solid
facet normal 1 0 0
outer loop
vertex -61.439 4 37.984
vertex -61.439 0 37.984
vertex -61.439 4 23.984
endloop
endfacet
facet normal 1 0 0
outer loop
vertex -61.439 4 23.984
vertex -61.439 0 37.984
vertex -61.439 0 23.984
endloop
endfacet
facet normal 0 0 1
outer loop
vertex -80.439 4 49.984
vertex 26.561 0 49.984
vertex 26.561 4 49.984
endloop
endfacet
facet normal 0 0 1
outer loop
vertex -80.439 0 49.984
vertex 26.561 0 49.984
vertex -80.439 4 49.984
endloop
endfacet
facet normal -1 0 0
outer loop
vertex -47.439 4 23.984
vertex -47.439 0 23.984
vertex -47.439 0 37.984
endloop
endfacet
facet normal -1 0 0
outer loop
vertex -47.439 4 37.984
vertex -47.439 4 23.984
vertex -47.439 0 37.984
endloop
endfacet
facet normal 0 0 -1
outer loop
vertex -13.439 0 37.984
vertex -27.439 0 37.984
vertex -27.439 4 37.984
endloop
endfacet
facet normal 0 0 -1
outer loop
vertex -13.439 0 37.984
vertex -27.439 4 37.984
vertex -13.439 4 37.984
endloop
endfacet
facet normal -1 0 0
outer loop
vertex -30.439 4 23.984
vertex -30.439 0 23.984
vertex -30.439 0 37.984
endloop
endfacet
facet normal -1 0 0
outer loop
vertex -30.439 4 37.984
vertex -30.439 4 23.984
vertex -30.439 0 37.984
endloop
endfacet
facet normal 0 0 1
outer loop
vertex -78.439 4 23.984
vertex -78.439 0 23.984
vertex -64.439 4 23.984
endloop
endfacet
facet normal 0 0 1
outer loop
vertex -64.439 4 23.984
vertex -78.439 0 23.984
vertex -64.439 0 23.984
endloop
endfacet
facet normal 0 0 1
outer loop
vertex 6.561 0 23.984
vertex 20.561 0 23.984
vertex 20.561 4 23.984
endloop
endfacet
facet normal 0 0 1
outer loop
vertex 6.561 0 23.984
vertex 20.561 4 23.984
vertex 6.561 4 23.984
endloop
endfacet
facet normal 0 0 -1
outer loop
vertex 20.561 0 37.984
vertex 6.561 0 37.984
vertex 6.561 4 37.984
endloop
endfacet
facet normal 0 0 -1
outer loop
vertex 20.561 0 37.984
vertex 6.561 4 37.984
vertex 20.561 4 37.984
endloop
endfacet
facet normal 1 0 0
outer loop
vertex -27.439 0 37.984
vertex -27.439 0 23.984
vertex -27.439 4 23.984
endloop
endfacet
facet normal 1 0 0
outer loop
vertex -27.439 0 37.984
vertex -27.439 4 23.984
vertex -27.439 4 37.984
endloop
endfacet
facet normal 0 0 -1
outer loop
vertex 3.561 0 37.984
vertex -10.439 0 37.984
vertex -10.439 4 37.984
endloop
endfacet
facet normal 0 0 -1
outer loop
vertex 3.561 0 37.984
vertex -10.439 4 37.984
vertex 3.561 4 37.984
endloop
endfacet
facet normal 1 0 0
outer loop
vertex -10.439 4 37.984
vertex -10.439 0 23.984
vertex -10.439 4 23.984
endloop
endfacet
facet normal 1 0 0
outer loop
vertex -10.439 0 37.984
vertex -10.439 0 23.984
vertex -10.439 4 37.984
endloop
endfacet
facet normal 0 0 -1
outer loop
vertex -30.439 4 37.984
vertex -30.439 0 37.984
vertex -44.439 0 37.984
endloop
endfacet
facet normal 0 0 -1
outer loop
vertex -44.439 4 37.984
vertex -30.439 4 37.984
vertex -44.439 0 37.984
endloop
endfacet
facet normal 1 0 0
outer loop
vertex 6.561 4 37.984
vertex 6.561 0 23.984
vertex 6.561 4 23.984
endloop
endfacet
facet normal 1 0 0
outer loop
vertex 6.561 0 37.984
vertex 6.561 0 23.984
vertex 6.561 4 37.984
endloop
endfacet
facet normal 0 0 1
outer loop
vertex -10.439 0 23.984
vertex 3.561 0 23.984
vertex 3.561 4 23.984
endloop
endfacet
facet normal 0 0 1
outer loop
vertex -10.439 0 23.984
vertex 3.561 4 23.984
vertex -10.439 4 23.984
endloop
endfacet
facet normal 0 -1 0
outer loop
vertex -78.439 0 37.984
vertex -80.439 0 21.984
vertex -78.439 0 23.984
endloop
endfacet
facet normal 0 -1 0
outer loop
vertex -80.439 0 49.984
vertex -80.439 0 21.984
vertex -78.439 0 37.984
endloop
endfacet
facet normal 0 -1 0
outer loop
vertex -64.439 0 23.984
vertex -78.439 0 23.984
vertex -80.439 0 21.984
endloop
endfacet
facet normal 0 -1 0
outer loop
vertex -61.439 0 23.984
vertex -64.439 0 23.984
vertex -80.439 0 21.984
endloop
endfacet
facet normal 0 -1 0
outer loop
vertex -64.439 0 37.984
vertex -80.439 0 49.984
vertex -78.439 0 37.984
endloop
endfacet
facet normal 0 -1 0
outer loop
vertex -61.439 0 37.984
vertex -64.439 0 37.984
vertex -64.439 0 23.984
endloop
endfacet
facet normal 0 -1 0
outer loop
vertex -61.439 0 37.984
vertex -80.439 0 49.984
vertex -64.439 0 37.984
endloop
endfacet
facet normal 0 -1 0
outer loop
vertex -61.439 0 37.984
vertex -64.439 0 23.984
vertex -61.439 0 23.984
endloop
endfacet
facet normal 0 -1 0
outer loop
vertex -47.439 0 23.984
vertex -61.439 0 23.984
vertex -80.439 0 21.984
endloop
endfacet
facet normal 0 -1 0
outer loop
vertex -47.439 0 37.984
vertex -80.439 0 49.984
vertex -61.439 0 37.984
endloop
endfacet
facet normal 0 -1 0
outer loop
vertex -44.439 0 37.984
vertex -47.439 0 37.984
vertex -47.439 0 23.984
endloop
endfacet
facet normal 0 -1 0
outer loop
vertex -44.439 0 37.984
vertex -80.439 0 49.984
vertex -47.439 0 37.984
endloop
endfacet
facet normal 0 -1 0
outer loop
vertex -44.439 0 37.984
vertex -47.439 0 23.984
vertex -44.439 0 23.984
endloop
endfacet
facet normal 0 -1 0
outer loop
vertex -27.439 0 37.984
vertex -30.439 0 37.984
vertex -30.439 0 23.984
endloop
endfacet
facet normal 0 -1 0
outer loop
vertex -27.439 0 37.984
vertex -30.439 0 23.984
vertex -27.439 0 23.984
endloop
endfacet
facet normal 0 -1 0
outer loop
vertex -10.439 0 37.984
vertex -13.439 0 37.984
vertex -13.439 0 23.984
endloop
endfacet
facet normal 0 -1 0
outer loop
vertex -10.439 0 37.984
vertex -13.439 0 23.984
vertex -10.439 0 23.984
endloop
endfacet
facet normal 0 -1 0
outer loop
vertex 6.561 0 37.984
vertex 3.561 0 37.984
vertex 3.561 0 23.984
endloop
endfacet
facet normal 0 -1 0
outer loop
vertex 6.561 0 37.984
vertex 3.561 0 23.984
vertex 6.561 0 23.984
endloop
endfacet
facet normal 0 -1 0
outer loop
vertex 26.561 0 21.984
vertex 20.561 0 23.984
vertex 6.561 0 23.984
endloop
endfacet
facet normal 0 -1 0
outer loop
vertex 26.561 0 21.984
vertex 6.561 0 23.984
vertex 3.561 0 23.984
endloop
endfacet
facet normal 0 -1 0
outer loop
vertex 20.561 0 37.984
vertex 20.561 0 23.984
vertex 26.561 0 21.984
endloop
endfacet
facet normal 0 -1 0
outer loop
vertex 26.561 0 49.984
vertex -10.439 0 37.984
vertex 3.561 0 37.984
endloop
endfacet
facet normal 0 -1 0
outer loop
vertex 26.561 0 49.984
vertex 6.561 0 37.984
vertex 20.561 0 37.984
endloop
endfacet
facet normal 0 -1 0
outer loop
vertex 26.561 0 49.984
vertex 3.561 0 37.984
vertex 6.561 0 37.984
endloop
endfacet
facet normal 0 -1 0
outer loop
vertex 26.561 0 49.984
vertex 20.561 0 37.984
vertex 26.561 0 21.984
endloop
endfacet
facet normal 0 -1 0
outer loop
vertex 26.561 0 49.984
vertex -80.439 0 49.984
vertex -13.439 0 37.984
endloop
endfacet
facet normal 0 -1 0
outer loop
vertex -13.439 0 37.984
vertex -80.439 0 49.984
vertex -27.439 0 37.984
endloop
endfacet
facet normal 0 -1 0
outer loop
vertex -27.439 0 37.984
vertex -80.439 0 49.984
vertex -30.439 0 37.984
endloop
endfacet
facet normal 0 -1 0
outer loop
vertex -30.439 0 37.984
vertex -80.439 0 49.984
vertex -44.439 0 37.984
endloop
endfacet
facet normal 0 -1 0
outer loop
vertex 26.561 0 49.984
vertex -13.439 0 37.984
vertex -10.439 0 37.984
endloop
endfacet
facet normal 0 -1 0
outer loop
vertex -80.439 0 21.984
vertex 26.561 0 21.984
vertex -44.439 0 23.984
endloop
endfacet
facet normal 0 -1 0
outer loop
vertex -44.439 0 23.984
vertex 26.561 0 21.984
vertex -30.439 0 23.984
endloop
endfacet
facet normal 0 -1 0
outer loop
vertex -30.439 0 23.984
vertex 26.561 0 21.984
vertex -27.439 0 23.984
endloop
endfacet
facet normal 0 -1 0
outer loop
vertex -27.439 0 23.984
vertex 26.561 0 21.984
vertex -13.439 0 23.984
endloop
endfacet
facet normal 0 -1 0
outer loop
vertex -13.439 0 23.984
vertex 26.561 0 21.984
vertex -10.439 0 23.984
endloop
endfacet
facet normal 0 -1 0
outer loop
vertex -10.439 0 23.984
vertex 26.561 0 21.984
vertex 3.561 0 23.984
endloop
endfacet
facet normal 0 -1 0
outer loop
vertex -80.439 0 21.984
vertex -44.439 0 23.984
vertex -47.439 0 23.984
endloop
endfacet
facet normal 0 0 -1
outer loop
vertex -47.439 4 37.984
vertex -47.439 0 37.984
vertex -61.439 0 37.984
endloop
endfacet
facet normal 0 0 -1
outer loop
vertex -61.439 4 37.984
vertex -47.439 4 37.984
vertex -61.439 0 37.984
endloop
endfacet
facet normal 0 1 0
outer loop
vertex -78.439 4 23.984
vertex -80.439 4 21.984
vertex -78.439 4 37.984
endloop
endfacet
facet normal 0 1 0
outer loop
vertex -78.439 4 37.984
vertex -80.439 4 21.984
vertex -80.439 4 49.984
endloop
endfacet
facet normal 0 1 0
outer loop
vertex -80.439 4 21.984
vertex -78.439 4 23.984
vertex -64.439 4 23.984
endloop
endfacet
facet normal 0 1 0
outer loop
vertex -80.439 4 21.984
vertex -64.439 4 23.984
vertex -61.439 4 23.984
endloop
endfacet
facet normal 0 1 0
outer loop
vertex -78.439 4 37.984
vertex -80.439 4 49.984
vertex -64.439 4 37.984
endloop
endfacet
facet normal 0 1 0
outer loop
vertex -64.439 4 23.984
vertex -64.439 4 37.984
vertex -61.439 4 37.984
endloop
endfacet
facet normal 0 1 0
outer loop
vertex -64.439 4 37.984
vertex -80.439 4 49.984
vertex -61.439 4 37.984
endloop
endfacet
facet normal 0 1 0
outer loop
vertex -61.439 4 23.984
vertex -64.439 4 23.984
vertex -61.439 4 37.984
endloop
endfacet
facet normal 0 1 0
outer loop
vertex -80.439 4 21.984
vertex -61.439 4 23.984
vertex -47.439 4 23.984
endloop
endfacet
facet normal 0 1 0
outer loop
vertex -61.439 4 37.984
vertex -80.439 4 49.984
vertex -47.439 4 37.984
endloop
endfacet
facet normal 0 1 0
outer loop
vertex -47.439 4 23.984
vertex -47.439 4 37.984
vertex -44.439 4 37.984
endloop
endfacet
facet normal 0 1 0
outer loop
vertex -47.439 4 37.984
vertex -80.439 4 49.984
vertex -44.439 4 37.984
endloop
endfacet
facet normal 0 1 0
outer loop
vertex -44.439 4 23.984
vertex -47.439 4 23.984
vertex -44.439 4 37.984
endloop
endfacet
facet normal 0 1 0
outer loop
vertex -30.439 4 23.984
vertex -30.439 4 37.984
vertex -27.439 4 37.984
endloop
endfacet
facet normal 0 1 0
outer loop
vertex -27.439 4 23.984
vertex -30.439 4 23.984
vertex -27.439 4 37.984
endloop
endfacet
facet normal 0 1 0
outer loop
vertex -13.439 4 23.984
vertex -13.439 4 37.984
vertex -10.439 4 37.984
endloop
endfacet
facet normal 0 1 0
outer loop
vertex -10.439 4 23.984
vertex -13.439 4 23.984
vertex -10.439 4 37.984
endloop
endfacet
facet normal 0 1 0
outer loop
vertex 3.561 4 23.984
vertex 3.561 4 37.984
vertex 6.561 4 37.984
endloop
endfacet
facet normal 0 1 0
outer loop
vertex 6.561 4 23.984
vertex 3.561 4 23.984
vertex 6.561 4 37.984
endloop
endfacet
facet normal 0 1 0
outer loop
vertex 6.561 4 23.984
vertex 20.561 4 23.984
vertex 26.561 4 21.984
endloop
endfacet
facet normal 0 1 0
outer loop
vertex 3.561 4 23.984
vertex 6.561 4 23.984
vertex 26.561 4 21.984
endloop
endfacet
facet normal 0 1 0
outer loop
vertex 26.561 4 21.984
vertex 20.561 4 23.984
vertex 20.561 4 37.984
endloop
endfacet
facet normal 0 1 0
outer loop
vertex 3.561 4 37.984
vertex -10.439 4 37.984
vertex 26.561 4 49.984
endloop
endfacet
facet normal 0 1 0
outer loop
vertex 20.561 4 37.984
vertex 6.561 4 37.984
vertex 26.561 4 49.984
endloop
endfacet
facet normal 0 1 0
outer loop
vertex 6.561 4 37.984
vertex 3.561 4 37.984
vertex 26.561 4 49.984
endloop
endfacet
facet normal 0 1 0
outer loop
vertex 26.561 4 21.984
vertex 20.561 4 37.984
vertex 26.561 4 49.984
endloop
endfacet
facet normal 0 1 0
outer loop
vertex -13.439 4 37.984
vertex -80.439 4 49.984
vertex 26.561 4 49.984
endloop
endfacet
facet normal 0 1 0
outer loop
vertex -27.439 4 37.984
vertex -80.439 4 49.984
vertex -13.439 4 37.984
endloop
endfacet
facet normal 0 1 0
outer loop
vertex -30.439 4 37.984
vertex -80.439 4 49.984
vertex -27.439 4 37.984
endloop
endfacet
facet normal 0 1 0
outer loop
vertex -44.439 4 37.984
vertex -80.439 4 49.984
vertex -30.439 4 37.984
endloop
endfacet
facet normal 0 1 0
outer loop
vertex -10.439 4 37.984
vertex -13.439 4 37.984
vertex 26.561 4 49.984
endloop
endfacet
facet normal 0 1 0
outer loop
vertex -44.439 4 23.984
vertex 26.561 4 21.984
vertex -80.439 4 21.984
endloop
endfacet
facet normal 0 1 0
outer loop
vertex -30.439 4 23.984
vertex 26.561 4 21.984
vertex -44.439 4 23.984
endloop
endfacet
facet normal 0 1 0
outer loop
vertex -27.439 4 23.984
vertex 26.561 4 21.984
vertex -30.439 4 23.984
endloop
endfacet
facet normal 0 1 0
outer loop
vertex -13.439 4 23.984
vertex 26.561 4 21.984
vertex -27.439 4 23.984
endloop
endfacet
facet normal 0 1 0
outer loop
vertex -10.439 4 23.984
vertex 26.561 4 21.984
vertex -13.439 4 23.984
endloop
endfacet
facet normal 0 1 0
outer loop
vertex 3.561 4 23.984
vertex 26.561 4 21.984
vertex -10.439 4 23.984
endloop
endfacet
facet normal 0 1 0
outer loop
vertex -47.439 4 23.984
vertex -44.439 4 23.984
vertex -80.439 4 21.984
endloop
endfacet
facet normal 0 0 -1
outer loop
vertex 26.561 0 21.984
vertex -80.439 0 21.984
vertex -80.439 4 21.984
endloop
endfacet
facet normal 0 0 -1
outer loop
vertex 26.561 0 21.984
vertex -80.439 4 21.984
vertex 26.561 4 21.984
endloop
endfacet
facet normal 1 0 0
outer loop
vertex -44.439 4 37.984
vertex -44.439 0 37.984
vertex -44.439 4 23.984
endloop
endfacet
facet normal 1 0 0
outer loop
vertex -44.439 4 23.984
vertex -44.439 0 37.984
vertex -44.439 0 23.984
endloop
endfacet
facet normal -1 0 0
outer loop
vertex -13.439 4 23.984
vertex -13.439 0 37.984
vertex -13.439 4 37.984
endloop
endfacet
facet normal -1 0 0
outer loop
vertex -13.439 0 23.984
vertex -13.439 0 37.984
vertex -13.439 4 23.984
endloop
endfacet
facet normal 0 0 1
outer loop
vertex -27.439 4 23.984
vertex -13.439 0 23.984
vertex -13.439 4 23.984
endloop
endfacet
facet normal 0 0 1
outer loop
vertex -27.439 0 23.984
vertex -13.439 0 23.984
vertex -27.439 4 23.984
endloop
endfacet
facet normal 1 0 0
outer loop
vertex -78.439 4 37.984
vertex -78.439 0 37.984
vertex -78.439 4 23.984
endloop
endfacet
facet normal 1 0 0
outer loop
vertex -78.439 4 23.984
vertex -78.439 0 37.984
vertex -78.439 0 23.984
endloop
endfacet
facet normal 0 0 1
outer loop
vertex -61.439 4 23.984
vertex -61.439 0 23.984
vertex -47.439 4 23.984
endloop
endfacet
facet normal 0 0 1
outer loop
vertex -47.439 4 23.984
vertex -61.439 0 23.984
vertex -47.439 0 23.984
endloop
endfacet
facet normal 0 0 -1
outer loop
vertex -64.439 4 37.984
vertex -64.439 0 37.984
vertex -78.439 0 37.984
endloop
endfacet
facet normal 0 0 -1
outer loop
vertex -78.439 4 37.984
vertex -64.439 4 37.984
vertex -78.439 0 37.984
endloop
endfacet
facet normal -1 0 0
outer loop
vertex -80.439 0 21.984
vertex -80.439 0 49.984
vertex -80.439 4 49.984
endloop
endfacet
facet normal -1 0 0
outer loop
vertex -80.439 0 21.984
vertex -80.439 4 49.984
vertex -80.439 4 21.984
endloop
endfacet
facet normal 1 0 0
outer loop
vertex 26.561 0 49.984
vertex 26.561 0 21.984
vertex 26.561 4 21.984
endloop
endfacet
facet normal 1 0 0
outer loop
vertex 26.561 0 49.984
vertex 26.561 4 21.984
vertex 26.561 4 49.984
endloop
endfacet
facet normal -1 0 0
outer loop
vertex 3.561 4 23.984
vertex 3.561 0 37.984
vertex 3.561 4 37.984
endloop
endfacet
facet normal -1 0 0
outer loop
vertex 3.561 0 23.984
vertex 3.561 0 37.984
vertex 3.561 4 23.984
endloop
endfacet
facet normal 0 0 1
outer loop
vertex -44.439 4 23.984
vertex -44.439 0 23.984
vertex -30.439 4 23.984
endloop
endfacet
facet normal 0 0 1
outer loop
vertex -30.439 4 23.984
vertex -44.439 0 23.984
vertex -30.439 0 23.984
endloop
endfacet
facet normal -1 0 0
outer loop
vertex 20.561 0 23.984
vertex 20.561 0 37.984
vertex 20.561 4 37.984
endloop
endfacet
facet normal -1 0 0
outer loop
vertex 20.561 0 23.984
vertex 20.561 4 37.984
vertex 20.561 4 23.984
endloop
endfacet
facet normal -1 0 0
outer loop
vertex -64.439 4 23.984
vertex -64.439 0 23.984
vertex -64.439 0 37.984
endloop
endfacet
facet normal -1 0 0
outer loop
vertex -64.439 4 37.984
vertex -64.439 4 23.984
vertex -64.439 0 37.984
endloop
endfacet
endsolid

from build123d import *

# Parameters (mm, degrees)
EXTRUDE_1_DEPTH = 4


with BuildPart() as part:
    # Sketch 1 → Бобышка-Вытянуть1 (new body)
    with BuildSketch(Plane(origin=(26.561401347, 0, 21.984207178), x_dir=(-0.9674249636260779, -8.775997465141552e-15, 0.25315793440672957), z_dir=(0, 1, 0))):
        Polygon((0, 0), (7.088422163, 27.087898982), (110.602893271, 0), (103.514471108, -27.087898982), align=None)
        Polygon((9.855076732, 13.959851812), (6.310865651, 0.415902321), (19.854815141, -3.128308761), (23.399026223, 10.41564073), align=None, mode=Mode.SUBTRACT)
        Polygon((105.630148131, -11.102783695), (102.08593705, -24.646733185), (88.541987559, -21.102522104), (92.08619864, -7.558572613), align=None, mode=Mode.SUBTRACT)
        Polygon((89.18392375, -6.79909881), (85.639712668, -20.343048301), (72.095763177, -16.798837219), (75.639974259, -3.254887728), align=None, mode=Mode.SUBTRACT)
        Polygon((69.193488286, -16.039363416), (55.649538795, -12.495152334), (59.193749877, 1.048797157), (72.737699368, -2.495413925), align=None, mode=Mode.SUBTRACT)
        Polygon((52.747263905, -11.735678531), (56.291474986, 1.80827096), (42.747525496, 5.352482042), (39.203314414, -8.191467449), align=None, mode=Mode.SUBTRACT)
        Polygon((39.845250605, 6.111955845), (26.301301114, 9.656166927), (22.757090032, -3.887782564), (36.301039523, -7.431993646), align=None, mode=Mode.SUBTRACT)
    extrude(amount=EXTRUDE_1_DEPTH)


solid = part.part
